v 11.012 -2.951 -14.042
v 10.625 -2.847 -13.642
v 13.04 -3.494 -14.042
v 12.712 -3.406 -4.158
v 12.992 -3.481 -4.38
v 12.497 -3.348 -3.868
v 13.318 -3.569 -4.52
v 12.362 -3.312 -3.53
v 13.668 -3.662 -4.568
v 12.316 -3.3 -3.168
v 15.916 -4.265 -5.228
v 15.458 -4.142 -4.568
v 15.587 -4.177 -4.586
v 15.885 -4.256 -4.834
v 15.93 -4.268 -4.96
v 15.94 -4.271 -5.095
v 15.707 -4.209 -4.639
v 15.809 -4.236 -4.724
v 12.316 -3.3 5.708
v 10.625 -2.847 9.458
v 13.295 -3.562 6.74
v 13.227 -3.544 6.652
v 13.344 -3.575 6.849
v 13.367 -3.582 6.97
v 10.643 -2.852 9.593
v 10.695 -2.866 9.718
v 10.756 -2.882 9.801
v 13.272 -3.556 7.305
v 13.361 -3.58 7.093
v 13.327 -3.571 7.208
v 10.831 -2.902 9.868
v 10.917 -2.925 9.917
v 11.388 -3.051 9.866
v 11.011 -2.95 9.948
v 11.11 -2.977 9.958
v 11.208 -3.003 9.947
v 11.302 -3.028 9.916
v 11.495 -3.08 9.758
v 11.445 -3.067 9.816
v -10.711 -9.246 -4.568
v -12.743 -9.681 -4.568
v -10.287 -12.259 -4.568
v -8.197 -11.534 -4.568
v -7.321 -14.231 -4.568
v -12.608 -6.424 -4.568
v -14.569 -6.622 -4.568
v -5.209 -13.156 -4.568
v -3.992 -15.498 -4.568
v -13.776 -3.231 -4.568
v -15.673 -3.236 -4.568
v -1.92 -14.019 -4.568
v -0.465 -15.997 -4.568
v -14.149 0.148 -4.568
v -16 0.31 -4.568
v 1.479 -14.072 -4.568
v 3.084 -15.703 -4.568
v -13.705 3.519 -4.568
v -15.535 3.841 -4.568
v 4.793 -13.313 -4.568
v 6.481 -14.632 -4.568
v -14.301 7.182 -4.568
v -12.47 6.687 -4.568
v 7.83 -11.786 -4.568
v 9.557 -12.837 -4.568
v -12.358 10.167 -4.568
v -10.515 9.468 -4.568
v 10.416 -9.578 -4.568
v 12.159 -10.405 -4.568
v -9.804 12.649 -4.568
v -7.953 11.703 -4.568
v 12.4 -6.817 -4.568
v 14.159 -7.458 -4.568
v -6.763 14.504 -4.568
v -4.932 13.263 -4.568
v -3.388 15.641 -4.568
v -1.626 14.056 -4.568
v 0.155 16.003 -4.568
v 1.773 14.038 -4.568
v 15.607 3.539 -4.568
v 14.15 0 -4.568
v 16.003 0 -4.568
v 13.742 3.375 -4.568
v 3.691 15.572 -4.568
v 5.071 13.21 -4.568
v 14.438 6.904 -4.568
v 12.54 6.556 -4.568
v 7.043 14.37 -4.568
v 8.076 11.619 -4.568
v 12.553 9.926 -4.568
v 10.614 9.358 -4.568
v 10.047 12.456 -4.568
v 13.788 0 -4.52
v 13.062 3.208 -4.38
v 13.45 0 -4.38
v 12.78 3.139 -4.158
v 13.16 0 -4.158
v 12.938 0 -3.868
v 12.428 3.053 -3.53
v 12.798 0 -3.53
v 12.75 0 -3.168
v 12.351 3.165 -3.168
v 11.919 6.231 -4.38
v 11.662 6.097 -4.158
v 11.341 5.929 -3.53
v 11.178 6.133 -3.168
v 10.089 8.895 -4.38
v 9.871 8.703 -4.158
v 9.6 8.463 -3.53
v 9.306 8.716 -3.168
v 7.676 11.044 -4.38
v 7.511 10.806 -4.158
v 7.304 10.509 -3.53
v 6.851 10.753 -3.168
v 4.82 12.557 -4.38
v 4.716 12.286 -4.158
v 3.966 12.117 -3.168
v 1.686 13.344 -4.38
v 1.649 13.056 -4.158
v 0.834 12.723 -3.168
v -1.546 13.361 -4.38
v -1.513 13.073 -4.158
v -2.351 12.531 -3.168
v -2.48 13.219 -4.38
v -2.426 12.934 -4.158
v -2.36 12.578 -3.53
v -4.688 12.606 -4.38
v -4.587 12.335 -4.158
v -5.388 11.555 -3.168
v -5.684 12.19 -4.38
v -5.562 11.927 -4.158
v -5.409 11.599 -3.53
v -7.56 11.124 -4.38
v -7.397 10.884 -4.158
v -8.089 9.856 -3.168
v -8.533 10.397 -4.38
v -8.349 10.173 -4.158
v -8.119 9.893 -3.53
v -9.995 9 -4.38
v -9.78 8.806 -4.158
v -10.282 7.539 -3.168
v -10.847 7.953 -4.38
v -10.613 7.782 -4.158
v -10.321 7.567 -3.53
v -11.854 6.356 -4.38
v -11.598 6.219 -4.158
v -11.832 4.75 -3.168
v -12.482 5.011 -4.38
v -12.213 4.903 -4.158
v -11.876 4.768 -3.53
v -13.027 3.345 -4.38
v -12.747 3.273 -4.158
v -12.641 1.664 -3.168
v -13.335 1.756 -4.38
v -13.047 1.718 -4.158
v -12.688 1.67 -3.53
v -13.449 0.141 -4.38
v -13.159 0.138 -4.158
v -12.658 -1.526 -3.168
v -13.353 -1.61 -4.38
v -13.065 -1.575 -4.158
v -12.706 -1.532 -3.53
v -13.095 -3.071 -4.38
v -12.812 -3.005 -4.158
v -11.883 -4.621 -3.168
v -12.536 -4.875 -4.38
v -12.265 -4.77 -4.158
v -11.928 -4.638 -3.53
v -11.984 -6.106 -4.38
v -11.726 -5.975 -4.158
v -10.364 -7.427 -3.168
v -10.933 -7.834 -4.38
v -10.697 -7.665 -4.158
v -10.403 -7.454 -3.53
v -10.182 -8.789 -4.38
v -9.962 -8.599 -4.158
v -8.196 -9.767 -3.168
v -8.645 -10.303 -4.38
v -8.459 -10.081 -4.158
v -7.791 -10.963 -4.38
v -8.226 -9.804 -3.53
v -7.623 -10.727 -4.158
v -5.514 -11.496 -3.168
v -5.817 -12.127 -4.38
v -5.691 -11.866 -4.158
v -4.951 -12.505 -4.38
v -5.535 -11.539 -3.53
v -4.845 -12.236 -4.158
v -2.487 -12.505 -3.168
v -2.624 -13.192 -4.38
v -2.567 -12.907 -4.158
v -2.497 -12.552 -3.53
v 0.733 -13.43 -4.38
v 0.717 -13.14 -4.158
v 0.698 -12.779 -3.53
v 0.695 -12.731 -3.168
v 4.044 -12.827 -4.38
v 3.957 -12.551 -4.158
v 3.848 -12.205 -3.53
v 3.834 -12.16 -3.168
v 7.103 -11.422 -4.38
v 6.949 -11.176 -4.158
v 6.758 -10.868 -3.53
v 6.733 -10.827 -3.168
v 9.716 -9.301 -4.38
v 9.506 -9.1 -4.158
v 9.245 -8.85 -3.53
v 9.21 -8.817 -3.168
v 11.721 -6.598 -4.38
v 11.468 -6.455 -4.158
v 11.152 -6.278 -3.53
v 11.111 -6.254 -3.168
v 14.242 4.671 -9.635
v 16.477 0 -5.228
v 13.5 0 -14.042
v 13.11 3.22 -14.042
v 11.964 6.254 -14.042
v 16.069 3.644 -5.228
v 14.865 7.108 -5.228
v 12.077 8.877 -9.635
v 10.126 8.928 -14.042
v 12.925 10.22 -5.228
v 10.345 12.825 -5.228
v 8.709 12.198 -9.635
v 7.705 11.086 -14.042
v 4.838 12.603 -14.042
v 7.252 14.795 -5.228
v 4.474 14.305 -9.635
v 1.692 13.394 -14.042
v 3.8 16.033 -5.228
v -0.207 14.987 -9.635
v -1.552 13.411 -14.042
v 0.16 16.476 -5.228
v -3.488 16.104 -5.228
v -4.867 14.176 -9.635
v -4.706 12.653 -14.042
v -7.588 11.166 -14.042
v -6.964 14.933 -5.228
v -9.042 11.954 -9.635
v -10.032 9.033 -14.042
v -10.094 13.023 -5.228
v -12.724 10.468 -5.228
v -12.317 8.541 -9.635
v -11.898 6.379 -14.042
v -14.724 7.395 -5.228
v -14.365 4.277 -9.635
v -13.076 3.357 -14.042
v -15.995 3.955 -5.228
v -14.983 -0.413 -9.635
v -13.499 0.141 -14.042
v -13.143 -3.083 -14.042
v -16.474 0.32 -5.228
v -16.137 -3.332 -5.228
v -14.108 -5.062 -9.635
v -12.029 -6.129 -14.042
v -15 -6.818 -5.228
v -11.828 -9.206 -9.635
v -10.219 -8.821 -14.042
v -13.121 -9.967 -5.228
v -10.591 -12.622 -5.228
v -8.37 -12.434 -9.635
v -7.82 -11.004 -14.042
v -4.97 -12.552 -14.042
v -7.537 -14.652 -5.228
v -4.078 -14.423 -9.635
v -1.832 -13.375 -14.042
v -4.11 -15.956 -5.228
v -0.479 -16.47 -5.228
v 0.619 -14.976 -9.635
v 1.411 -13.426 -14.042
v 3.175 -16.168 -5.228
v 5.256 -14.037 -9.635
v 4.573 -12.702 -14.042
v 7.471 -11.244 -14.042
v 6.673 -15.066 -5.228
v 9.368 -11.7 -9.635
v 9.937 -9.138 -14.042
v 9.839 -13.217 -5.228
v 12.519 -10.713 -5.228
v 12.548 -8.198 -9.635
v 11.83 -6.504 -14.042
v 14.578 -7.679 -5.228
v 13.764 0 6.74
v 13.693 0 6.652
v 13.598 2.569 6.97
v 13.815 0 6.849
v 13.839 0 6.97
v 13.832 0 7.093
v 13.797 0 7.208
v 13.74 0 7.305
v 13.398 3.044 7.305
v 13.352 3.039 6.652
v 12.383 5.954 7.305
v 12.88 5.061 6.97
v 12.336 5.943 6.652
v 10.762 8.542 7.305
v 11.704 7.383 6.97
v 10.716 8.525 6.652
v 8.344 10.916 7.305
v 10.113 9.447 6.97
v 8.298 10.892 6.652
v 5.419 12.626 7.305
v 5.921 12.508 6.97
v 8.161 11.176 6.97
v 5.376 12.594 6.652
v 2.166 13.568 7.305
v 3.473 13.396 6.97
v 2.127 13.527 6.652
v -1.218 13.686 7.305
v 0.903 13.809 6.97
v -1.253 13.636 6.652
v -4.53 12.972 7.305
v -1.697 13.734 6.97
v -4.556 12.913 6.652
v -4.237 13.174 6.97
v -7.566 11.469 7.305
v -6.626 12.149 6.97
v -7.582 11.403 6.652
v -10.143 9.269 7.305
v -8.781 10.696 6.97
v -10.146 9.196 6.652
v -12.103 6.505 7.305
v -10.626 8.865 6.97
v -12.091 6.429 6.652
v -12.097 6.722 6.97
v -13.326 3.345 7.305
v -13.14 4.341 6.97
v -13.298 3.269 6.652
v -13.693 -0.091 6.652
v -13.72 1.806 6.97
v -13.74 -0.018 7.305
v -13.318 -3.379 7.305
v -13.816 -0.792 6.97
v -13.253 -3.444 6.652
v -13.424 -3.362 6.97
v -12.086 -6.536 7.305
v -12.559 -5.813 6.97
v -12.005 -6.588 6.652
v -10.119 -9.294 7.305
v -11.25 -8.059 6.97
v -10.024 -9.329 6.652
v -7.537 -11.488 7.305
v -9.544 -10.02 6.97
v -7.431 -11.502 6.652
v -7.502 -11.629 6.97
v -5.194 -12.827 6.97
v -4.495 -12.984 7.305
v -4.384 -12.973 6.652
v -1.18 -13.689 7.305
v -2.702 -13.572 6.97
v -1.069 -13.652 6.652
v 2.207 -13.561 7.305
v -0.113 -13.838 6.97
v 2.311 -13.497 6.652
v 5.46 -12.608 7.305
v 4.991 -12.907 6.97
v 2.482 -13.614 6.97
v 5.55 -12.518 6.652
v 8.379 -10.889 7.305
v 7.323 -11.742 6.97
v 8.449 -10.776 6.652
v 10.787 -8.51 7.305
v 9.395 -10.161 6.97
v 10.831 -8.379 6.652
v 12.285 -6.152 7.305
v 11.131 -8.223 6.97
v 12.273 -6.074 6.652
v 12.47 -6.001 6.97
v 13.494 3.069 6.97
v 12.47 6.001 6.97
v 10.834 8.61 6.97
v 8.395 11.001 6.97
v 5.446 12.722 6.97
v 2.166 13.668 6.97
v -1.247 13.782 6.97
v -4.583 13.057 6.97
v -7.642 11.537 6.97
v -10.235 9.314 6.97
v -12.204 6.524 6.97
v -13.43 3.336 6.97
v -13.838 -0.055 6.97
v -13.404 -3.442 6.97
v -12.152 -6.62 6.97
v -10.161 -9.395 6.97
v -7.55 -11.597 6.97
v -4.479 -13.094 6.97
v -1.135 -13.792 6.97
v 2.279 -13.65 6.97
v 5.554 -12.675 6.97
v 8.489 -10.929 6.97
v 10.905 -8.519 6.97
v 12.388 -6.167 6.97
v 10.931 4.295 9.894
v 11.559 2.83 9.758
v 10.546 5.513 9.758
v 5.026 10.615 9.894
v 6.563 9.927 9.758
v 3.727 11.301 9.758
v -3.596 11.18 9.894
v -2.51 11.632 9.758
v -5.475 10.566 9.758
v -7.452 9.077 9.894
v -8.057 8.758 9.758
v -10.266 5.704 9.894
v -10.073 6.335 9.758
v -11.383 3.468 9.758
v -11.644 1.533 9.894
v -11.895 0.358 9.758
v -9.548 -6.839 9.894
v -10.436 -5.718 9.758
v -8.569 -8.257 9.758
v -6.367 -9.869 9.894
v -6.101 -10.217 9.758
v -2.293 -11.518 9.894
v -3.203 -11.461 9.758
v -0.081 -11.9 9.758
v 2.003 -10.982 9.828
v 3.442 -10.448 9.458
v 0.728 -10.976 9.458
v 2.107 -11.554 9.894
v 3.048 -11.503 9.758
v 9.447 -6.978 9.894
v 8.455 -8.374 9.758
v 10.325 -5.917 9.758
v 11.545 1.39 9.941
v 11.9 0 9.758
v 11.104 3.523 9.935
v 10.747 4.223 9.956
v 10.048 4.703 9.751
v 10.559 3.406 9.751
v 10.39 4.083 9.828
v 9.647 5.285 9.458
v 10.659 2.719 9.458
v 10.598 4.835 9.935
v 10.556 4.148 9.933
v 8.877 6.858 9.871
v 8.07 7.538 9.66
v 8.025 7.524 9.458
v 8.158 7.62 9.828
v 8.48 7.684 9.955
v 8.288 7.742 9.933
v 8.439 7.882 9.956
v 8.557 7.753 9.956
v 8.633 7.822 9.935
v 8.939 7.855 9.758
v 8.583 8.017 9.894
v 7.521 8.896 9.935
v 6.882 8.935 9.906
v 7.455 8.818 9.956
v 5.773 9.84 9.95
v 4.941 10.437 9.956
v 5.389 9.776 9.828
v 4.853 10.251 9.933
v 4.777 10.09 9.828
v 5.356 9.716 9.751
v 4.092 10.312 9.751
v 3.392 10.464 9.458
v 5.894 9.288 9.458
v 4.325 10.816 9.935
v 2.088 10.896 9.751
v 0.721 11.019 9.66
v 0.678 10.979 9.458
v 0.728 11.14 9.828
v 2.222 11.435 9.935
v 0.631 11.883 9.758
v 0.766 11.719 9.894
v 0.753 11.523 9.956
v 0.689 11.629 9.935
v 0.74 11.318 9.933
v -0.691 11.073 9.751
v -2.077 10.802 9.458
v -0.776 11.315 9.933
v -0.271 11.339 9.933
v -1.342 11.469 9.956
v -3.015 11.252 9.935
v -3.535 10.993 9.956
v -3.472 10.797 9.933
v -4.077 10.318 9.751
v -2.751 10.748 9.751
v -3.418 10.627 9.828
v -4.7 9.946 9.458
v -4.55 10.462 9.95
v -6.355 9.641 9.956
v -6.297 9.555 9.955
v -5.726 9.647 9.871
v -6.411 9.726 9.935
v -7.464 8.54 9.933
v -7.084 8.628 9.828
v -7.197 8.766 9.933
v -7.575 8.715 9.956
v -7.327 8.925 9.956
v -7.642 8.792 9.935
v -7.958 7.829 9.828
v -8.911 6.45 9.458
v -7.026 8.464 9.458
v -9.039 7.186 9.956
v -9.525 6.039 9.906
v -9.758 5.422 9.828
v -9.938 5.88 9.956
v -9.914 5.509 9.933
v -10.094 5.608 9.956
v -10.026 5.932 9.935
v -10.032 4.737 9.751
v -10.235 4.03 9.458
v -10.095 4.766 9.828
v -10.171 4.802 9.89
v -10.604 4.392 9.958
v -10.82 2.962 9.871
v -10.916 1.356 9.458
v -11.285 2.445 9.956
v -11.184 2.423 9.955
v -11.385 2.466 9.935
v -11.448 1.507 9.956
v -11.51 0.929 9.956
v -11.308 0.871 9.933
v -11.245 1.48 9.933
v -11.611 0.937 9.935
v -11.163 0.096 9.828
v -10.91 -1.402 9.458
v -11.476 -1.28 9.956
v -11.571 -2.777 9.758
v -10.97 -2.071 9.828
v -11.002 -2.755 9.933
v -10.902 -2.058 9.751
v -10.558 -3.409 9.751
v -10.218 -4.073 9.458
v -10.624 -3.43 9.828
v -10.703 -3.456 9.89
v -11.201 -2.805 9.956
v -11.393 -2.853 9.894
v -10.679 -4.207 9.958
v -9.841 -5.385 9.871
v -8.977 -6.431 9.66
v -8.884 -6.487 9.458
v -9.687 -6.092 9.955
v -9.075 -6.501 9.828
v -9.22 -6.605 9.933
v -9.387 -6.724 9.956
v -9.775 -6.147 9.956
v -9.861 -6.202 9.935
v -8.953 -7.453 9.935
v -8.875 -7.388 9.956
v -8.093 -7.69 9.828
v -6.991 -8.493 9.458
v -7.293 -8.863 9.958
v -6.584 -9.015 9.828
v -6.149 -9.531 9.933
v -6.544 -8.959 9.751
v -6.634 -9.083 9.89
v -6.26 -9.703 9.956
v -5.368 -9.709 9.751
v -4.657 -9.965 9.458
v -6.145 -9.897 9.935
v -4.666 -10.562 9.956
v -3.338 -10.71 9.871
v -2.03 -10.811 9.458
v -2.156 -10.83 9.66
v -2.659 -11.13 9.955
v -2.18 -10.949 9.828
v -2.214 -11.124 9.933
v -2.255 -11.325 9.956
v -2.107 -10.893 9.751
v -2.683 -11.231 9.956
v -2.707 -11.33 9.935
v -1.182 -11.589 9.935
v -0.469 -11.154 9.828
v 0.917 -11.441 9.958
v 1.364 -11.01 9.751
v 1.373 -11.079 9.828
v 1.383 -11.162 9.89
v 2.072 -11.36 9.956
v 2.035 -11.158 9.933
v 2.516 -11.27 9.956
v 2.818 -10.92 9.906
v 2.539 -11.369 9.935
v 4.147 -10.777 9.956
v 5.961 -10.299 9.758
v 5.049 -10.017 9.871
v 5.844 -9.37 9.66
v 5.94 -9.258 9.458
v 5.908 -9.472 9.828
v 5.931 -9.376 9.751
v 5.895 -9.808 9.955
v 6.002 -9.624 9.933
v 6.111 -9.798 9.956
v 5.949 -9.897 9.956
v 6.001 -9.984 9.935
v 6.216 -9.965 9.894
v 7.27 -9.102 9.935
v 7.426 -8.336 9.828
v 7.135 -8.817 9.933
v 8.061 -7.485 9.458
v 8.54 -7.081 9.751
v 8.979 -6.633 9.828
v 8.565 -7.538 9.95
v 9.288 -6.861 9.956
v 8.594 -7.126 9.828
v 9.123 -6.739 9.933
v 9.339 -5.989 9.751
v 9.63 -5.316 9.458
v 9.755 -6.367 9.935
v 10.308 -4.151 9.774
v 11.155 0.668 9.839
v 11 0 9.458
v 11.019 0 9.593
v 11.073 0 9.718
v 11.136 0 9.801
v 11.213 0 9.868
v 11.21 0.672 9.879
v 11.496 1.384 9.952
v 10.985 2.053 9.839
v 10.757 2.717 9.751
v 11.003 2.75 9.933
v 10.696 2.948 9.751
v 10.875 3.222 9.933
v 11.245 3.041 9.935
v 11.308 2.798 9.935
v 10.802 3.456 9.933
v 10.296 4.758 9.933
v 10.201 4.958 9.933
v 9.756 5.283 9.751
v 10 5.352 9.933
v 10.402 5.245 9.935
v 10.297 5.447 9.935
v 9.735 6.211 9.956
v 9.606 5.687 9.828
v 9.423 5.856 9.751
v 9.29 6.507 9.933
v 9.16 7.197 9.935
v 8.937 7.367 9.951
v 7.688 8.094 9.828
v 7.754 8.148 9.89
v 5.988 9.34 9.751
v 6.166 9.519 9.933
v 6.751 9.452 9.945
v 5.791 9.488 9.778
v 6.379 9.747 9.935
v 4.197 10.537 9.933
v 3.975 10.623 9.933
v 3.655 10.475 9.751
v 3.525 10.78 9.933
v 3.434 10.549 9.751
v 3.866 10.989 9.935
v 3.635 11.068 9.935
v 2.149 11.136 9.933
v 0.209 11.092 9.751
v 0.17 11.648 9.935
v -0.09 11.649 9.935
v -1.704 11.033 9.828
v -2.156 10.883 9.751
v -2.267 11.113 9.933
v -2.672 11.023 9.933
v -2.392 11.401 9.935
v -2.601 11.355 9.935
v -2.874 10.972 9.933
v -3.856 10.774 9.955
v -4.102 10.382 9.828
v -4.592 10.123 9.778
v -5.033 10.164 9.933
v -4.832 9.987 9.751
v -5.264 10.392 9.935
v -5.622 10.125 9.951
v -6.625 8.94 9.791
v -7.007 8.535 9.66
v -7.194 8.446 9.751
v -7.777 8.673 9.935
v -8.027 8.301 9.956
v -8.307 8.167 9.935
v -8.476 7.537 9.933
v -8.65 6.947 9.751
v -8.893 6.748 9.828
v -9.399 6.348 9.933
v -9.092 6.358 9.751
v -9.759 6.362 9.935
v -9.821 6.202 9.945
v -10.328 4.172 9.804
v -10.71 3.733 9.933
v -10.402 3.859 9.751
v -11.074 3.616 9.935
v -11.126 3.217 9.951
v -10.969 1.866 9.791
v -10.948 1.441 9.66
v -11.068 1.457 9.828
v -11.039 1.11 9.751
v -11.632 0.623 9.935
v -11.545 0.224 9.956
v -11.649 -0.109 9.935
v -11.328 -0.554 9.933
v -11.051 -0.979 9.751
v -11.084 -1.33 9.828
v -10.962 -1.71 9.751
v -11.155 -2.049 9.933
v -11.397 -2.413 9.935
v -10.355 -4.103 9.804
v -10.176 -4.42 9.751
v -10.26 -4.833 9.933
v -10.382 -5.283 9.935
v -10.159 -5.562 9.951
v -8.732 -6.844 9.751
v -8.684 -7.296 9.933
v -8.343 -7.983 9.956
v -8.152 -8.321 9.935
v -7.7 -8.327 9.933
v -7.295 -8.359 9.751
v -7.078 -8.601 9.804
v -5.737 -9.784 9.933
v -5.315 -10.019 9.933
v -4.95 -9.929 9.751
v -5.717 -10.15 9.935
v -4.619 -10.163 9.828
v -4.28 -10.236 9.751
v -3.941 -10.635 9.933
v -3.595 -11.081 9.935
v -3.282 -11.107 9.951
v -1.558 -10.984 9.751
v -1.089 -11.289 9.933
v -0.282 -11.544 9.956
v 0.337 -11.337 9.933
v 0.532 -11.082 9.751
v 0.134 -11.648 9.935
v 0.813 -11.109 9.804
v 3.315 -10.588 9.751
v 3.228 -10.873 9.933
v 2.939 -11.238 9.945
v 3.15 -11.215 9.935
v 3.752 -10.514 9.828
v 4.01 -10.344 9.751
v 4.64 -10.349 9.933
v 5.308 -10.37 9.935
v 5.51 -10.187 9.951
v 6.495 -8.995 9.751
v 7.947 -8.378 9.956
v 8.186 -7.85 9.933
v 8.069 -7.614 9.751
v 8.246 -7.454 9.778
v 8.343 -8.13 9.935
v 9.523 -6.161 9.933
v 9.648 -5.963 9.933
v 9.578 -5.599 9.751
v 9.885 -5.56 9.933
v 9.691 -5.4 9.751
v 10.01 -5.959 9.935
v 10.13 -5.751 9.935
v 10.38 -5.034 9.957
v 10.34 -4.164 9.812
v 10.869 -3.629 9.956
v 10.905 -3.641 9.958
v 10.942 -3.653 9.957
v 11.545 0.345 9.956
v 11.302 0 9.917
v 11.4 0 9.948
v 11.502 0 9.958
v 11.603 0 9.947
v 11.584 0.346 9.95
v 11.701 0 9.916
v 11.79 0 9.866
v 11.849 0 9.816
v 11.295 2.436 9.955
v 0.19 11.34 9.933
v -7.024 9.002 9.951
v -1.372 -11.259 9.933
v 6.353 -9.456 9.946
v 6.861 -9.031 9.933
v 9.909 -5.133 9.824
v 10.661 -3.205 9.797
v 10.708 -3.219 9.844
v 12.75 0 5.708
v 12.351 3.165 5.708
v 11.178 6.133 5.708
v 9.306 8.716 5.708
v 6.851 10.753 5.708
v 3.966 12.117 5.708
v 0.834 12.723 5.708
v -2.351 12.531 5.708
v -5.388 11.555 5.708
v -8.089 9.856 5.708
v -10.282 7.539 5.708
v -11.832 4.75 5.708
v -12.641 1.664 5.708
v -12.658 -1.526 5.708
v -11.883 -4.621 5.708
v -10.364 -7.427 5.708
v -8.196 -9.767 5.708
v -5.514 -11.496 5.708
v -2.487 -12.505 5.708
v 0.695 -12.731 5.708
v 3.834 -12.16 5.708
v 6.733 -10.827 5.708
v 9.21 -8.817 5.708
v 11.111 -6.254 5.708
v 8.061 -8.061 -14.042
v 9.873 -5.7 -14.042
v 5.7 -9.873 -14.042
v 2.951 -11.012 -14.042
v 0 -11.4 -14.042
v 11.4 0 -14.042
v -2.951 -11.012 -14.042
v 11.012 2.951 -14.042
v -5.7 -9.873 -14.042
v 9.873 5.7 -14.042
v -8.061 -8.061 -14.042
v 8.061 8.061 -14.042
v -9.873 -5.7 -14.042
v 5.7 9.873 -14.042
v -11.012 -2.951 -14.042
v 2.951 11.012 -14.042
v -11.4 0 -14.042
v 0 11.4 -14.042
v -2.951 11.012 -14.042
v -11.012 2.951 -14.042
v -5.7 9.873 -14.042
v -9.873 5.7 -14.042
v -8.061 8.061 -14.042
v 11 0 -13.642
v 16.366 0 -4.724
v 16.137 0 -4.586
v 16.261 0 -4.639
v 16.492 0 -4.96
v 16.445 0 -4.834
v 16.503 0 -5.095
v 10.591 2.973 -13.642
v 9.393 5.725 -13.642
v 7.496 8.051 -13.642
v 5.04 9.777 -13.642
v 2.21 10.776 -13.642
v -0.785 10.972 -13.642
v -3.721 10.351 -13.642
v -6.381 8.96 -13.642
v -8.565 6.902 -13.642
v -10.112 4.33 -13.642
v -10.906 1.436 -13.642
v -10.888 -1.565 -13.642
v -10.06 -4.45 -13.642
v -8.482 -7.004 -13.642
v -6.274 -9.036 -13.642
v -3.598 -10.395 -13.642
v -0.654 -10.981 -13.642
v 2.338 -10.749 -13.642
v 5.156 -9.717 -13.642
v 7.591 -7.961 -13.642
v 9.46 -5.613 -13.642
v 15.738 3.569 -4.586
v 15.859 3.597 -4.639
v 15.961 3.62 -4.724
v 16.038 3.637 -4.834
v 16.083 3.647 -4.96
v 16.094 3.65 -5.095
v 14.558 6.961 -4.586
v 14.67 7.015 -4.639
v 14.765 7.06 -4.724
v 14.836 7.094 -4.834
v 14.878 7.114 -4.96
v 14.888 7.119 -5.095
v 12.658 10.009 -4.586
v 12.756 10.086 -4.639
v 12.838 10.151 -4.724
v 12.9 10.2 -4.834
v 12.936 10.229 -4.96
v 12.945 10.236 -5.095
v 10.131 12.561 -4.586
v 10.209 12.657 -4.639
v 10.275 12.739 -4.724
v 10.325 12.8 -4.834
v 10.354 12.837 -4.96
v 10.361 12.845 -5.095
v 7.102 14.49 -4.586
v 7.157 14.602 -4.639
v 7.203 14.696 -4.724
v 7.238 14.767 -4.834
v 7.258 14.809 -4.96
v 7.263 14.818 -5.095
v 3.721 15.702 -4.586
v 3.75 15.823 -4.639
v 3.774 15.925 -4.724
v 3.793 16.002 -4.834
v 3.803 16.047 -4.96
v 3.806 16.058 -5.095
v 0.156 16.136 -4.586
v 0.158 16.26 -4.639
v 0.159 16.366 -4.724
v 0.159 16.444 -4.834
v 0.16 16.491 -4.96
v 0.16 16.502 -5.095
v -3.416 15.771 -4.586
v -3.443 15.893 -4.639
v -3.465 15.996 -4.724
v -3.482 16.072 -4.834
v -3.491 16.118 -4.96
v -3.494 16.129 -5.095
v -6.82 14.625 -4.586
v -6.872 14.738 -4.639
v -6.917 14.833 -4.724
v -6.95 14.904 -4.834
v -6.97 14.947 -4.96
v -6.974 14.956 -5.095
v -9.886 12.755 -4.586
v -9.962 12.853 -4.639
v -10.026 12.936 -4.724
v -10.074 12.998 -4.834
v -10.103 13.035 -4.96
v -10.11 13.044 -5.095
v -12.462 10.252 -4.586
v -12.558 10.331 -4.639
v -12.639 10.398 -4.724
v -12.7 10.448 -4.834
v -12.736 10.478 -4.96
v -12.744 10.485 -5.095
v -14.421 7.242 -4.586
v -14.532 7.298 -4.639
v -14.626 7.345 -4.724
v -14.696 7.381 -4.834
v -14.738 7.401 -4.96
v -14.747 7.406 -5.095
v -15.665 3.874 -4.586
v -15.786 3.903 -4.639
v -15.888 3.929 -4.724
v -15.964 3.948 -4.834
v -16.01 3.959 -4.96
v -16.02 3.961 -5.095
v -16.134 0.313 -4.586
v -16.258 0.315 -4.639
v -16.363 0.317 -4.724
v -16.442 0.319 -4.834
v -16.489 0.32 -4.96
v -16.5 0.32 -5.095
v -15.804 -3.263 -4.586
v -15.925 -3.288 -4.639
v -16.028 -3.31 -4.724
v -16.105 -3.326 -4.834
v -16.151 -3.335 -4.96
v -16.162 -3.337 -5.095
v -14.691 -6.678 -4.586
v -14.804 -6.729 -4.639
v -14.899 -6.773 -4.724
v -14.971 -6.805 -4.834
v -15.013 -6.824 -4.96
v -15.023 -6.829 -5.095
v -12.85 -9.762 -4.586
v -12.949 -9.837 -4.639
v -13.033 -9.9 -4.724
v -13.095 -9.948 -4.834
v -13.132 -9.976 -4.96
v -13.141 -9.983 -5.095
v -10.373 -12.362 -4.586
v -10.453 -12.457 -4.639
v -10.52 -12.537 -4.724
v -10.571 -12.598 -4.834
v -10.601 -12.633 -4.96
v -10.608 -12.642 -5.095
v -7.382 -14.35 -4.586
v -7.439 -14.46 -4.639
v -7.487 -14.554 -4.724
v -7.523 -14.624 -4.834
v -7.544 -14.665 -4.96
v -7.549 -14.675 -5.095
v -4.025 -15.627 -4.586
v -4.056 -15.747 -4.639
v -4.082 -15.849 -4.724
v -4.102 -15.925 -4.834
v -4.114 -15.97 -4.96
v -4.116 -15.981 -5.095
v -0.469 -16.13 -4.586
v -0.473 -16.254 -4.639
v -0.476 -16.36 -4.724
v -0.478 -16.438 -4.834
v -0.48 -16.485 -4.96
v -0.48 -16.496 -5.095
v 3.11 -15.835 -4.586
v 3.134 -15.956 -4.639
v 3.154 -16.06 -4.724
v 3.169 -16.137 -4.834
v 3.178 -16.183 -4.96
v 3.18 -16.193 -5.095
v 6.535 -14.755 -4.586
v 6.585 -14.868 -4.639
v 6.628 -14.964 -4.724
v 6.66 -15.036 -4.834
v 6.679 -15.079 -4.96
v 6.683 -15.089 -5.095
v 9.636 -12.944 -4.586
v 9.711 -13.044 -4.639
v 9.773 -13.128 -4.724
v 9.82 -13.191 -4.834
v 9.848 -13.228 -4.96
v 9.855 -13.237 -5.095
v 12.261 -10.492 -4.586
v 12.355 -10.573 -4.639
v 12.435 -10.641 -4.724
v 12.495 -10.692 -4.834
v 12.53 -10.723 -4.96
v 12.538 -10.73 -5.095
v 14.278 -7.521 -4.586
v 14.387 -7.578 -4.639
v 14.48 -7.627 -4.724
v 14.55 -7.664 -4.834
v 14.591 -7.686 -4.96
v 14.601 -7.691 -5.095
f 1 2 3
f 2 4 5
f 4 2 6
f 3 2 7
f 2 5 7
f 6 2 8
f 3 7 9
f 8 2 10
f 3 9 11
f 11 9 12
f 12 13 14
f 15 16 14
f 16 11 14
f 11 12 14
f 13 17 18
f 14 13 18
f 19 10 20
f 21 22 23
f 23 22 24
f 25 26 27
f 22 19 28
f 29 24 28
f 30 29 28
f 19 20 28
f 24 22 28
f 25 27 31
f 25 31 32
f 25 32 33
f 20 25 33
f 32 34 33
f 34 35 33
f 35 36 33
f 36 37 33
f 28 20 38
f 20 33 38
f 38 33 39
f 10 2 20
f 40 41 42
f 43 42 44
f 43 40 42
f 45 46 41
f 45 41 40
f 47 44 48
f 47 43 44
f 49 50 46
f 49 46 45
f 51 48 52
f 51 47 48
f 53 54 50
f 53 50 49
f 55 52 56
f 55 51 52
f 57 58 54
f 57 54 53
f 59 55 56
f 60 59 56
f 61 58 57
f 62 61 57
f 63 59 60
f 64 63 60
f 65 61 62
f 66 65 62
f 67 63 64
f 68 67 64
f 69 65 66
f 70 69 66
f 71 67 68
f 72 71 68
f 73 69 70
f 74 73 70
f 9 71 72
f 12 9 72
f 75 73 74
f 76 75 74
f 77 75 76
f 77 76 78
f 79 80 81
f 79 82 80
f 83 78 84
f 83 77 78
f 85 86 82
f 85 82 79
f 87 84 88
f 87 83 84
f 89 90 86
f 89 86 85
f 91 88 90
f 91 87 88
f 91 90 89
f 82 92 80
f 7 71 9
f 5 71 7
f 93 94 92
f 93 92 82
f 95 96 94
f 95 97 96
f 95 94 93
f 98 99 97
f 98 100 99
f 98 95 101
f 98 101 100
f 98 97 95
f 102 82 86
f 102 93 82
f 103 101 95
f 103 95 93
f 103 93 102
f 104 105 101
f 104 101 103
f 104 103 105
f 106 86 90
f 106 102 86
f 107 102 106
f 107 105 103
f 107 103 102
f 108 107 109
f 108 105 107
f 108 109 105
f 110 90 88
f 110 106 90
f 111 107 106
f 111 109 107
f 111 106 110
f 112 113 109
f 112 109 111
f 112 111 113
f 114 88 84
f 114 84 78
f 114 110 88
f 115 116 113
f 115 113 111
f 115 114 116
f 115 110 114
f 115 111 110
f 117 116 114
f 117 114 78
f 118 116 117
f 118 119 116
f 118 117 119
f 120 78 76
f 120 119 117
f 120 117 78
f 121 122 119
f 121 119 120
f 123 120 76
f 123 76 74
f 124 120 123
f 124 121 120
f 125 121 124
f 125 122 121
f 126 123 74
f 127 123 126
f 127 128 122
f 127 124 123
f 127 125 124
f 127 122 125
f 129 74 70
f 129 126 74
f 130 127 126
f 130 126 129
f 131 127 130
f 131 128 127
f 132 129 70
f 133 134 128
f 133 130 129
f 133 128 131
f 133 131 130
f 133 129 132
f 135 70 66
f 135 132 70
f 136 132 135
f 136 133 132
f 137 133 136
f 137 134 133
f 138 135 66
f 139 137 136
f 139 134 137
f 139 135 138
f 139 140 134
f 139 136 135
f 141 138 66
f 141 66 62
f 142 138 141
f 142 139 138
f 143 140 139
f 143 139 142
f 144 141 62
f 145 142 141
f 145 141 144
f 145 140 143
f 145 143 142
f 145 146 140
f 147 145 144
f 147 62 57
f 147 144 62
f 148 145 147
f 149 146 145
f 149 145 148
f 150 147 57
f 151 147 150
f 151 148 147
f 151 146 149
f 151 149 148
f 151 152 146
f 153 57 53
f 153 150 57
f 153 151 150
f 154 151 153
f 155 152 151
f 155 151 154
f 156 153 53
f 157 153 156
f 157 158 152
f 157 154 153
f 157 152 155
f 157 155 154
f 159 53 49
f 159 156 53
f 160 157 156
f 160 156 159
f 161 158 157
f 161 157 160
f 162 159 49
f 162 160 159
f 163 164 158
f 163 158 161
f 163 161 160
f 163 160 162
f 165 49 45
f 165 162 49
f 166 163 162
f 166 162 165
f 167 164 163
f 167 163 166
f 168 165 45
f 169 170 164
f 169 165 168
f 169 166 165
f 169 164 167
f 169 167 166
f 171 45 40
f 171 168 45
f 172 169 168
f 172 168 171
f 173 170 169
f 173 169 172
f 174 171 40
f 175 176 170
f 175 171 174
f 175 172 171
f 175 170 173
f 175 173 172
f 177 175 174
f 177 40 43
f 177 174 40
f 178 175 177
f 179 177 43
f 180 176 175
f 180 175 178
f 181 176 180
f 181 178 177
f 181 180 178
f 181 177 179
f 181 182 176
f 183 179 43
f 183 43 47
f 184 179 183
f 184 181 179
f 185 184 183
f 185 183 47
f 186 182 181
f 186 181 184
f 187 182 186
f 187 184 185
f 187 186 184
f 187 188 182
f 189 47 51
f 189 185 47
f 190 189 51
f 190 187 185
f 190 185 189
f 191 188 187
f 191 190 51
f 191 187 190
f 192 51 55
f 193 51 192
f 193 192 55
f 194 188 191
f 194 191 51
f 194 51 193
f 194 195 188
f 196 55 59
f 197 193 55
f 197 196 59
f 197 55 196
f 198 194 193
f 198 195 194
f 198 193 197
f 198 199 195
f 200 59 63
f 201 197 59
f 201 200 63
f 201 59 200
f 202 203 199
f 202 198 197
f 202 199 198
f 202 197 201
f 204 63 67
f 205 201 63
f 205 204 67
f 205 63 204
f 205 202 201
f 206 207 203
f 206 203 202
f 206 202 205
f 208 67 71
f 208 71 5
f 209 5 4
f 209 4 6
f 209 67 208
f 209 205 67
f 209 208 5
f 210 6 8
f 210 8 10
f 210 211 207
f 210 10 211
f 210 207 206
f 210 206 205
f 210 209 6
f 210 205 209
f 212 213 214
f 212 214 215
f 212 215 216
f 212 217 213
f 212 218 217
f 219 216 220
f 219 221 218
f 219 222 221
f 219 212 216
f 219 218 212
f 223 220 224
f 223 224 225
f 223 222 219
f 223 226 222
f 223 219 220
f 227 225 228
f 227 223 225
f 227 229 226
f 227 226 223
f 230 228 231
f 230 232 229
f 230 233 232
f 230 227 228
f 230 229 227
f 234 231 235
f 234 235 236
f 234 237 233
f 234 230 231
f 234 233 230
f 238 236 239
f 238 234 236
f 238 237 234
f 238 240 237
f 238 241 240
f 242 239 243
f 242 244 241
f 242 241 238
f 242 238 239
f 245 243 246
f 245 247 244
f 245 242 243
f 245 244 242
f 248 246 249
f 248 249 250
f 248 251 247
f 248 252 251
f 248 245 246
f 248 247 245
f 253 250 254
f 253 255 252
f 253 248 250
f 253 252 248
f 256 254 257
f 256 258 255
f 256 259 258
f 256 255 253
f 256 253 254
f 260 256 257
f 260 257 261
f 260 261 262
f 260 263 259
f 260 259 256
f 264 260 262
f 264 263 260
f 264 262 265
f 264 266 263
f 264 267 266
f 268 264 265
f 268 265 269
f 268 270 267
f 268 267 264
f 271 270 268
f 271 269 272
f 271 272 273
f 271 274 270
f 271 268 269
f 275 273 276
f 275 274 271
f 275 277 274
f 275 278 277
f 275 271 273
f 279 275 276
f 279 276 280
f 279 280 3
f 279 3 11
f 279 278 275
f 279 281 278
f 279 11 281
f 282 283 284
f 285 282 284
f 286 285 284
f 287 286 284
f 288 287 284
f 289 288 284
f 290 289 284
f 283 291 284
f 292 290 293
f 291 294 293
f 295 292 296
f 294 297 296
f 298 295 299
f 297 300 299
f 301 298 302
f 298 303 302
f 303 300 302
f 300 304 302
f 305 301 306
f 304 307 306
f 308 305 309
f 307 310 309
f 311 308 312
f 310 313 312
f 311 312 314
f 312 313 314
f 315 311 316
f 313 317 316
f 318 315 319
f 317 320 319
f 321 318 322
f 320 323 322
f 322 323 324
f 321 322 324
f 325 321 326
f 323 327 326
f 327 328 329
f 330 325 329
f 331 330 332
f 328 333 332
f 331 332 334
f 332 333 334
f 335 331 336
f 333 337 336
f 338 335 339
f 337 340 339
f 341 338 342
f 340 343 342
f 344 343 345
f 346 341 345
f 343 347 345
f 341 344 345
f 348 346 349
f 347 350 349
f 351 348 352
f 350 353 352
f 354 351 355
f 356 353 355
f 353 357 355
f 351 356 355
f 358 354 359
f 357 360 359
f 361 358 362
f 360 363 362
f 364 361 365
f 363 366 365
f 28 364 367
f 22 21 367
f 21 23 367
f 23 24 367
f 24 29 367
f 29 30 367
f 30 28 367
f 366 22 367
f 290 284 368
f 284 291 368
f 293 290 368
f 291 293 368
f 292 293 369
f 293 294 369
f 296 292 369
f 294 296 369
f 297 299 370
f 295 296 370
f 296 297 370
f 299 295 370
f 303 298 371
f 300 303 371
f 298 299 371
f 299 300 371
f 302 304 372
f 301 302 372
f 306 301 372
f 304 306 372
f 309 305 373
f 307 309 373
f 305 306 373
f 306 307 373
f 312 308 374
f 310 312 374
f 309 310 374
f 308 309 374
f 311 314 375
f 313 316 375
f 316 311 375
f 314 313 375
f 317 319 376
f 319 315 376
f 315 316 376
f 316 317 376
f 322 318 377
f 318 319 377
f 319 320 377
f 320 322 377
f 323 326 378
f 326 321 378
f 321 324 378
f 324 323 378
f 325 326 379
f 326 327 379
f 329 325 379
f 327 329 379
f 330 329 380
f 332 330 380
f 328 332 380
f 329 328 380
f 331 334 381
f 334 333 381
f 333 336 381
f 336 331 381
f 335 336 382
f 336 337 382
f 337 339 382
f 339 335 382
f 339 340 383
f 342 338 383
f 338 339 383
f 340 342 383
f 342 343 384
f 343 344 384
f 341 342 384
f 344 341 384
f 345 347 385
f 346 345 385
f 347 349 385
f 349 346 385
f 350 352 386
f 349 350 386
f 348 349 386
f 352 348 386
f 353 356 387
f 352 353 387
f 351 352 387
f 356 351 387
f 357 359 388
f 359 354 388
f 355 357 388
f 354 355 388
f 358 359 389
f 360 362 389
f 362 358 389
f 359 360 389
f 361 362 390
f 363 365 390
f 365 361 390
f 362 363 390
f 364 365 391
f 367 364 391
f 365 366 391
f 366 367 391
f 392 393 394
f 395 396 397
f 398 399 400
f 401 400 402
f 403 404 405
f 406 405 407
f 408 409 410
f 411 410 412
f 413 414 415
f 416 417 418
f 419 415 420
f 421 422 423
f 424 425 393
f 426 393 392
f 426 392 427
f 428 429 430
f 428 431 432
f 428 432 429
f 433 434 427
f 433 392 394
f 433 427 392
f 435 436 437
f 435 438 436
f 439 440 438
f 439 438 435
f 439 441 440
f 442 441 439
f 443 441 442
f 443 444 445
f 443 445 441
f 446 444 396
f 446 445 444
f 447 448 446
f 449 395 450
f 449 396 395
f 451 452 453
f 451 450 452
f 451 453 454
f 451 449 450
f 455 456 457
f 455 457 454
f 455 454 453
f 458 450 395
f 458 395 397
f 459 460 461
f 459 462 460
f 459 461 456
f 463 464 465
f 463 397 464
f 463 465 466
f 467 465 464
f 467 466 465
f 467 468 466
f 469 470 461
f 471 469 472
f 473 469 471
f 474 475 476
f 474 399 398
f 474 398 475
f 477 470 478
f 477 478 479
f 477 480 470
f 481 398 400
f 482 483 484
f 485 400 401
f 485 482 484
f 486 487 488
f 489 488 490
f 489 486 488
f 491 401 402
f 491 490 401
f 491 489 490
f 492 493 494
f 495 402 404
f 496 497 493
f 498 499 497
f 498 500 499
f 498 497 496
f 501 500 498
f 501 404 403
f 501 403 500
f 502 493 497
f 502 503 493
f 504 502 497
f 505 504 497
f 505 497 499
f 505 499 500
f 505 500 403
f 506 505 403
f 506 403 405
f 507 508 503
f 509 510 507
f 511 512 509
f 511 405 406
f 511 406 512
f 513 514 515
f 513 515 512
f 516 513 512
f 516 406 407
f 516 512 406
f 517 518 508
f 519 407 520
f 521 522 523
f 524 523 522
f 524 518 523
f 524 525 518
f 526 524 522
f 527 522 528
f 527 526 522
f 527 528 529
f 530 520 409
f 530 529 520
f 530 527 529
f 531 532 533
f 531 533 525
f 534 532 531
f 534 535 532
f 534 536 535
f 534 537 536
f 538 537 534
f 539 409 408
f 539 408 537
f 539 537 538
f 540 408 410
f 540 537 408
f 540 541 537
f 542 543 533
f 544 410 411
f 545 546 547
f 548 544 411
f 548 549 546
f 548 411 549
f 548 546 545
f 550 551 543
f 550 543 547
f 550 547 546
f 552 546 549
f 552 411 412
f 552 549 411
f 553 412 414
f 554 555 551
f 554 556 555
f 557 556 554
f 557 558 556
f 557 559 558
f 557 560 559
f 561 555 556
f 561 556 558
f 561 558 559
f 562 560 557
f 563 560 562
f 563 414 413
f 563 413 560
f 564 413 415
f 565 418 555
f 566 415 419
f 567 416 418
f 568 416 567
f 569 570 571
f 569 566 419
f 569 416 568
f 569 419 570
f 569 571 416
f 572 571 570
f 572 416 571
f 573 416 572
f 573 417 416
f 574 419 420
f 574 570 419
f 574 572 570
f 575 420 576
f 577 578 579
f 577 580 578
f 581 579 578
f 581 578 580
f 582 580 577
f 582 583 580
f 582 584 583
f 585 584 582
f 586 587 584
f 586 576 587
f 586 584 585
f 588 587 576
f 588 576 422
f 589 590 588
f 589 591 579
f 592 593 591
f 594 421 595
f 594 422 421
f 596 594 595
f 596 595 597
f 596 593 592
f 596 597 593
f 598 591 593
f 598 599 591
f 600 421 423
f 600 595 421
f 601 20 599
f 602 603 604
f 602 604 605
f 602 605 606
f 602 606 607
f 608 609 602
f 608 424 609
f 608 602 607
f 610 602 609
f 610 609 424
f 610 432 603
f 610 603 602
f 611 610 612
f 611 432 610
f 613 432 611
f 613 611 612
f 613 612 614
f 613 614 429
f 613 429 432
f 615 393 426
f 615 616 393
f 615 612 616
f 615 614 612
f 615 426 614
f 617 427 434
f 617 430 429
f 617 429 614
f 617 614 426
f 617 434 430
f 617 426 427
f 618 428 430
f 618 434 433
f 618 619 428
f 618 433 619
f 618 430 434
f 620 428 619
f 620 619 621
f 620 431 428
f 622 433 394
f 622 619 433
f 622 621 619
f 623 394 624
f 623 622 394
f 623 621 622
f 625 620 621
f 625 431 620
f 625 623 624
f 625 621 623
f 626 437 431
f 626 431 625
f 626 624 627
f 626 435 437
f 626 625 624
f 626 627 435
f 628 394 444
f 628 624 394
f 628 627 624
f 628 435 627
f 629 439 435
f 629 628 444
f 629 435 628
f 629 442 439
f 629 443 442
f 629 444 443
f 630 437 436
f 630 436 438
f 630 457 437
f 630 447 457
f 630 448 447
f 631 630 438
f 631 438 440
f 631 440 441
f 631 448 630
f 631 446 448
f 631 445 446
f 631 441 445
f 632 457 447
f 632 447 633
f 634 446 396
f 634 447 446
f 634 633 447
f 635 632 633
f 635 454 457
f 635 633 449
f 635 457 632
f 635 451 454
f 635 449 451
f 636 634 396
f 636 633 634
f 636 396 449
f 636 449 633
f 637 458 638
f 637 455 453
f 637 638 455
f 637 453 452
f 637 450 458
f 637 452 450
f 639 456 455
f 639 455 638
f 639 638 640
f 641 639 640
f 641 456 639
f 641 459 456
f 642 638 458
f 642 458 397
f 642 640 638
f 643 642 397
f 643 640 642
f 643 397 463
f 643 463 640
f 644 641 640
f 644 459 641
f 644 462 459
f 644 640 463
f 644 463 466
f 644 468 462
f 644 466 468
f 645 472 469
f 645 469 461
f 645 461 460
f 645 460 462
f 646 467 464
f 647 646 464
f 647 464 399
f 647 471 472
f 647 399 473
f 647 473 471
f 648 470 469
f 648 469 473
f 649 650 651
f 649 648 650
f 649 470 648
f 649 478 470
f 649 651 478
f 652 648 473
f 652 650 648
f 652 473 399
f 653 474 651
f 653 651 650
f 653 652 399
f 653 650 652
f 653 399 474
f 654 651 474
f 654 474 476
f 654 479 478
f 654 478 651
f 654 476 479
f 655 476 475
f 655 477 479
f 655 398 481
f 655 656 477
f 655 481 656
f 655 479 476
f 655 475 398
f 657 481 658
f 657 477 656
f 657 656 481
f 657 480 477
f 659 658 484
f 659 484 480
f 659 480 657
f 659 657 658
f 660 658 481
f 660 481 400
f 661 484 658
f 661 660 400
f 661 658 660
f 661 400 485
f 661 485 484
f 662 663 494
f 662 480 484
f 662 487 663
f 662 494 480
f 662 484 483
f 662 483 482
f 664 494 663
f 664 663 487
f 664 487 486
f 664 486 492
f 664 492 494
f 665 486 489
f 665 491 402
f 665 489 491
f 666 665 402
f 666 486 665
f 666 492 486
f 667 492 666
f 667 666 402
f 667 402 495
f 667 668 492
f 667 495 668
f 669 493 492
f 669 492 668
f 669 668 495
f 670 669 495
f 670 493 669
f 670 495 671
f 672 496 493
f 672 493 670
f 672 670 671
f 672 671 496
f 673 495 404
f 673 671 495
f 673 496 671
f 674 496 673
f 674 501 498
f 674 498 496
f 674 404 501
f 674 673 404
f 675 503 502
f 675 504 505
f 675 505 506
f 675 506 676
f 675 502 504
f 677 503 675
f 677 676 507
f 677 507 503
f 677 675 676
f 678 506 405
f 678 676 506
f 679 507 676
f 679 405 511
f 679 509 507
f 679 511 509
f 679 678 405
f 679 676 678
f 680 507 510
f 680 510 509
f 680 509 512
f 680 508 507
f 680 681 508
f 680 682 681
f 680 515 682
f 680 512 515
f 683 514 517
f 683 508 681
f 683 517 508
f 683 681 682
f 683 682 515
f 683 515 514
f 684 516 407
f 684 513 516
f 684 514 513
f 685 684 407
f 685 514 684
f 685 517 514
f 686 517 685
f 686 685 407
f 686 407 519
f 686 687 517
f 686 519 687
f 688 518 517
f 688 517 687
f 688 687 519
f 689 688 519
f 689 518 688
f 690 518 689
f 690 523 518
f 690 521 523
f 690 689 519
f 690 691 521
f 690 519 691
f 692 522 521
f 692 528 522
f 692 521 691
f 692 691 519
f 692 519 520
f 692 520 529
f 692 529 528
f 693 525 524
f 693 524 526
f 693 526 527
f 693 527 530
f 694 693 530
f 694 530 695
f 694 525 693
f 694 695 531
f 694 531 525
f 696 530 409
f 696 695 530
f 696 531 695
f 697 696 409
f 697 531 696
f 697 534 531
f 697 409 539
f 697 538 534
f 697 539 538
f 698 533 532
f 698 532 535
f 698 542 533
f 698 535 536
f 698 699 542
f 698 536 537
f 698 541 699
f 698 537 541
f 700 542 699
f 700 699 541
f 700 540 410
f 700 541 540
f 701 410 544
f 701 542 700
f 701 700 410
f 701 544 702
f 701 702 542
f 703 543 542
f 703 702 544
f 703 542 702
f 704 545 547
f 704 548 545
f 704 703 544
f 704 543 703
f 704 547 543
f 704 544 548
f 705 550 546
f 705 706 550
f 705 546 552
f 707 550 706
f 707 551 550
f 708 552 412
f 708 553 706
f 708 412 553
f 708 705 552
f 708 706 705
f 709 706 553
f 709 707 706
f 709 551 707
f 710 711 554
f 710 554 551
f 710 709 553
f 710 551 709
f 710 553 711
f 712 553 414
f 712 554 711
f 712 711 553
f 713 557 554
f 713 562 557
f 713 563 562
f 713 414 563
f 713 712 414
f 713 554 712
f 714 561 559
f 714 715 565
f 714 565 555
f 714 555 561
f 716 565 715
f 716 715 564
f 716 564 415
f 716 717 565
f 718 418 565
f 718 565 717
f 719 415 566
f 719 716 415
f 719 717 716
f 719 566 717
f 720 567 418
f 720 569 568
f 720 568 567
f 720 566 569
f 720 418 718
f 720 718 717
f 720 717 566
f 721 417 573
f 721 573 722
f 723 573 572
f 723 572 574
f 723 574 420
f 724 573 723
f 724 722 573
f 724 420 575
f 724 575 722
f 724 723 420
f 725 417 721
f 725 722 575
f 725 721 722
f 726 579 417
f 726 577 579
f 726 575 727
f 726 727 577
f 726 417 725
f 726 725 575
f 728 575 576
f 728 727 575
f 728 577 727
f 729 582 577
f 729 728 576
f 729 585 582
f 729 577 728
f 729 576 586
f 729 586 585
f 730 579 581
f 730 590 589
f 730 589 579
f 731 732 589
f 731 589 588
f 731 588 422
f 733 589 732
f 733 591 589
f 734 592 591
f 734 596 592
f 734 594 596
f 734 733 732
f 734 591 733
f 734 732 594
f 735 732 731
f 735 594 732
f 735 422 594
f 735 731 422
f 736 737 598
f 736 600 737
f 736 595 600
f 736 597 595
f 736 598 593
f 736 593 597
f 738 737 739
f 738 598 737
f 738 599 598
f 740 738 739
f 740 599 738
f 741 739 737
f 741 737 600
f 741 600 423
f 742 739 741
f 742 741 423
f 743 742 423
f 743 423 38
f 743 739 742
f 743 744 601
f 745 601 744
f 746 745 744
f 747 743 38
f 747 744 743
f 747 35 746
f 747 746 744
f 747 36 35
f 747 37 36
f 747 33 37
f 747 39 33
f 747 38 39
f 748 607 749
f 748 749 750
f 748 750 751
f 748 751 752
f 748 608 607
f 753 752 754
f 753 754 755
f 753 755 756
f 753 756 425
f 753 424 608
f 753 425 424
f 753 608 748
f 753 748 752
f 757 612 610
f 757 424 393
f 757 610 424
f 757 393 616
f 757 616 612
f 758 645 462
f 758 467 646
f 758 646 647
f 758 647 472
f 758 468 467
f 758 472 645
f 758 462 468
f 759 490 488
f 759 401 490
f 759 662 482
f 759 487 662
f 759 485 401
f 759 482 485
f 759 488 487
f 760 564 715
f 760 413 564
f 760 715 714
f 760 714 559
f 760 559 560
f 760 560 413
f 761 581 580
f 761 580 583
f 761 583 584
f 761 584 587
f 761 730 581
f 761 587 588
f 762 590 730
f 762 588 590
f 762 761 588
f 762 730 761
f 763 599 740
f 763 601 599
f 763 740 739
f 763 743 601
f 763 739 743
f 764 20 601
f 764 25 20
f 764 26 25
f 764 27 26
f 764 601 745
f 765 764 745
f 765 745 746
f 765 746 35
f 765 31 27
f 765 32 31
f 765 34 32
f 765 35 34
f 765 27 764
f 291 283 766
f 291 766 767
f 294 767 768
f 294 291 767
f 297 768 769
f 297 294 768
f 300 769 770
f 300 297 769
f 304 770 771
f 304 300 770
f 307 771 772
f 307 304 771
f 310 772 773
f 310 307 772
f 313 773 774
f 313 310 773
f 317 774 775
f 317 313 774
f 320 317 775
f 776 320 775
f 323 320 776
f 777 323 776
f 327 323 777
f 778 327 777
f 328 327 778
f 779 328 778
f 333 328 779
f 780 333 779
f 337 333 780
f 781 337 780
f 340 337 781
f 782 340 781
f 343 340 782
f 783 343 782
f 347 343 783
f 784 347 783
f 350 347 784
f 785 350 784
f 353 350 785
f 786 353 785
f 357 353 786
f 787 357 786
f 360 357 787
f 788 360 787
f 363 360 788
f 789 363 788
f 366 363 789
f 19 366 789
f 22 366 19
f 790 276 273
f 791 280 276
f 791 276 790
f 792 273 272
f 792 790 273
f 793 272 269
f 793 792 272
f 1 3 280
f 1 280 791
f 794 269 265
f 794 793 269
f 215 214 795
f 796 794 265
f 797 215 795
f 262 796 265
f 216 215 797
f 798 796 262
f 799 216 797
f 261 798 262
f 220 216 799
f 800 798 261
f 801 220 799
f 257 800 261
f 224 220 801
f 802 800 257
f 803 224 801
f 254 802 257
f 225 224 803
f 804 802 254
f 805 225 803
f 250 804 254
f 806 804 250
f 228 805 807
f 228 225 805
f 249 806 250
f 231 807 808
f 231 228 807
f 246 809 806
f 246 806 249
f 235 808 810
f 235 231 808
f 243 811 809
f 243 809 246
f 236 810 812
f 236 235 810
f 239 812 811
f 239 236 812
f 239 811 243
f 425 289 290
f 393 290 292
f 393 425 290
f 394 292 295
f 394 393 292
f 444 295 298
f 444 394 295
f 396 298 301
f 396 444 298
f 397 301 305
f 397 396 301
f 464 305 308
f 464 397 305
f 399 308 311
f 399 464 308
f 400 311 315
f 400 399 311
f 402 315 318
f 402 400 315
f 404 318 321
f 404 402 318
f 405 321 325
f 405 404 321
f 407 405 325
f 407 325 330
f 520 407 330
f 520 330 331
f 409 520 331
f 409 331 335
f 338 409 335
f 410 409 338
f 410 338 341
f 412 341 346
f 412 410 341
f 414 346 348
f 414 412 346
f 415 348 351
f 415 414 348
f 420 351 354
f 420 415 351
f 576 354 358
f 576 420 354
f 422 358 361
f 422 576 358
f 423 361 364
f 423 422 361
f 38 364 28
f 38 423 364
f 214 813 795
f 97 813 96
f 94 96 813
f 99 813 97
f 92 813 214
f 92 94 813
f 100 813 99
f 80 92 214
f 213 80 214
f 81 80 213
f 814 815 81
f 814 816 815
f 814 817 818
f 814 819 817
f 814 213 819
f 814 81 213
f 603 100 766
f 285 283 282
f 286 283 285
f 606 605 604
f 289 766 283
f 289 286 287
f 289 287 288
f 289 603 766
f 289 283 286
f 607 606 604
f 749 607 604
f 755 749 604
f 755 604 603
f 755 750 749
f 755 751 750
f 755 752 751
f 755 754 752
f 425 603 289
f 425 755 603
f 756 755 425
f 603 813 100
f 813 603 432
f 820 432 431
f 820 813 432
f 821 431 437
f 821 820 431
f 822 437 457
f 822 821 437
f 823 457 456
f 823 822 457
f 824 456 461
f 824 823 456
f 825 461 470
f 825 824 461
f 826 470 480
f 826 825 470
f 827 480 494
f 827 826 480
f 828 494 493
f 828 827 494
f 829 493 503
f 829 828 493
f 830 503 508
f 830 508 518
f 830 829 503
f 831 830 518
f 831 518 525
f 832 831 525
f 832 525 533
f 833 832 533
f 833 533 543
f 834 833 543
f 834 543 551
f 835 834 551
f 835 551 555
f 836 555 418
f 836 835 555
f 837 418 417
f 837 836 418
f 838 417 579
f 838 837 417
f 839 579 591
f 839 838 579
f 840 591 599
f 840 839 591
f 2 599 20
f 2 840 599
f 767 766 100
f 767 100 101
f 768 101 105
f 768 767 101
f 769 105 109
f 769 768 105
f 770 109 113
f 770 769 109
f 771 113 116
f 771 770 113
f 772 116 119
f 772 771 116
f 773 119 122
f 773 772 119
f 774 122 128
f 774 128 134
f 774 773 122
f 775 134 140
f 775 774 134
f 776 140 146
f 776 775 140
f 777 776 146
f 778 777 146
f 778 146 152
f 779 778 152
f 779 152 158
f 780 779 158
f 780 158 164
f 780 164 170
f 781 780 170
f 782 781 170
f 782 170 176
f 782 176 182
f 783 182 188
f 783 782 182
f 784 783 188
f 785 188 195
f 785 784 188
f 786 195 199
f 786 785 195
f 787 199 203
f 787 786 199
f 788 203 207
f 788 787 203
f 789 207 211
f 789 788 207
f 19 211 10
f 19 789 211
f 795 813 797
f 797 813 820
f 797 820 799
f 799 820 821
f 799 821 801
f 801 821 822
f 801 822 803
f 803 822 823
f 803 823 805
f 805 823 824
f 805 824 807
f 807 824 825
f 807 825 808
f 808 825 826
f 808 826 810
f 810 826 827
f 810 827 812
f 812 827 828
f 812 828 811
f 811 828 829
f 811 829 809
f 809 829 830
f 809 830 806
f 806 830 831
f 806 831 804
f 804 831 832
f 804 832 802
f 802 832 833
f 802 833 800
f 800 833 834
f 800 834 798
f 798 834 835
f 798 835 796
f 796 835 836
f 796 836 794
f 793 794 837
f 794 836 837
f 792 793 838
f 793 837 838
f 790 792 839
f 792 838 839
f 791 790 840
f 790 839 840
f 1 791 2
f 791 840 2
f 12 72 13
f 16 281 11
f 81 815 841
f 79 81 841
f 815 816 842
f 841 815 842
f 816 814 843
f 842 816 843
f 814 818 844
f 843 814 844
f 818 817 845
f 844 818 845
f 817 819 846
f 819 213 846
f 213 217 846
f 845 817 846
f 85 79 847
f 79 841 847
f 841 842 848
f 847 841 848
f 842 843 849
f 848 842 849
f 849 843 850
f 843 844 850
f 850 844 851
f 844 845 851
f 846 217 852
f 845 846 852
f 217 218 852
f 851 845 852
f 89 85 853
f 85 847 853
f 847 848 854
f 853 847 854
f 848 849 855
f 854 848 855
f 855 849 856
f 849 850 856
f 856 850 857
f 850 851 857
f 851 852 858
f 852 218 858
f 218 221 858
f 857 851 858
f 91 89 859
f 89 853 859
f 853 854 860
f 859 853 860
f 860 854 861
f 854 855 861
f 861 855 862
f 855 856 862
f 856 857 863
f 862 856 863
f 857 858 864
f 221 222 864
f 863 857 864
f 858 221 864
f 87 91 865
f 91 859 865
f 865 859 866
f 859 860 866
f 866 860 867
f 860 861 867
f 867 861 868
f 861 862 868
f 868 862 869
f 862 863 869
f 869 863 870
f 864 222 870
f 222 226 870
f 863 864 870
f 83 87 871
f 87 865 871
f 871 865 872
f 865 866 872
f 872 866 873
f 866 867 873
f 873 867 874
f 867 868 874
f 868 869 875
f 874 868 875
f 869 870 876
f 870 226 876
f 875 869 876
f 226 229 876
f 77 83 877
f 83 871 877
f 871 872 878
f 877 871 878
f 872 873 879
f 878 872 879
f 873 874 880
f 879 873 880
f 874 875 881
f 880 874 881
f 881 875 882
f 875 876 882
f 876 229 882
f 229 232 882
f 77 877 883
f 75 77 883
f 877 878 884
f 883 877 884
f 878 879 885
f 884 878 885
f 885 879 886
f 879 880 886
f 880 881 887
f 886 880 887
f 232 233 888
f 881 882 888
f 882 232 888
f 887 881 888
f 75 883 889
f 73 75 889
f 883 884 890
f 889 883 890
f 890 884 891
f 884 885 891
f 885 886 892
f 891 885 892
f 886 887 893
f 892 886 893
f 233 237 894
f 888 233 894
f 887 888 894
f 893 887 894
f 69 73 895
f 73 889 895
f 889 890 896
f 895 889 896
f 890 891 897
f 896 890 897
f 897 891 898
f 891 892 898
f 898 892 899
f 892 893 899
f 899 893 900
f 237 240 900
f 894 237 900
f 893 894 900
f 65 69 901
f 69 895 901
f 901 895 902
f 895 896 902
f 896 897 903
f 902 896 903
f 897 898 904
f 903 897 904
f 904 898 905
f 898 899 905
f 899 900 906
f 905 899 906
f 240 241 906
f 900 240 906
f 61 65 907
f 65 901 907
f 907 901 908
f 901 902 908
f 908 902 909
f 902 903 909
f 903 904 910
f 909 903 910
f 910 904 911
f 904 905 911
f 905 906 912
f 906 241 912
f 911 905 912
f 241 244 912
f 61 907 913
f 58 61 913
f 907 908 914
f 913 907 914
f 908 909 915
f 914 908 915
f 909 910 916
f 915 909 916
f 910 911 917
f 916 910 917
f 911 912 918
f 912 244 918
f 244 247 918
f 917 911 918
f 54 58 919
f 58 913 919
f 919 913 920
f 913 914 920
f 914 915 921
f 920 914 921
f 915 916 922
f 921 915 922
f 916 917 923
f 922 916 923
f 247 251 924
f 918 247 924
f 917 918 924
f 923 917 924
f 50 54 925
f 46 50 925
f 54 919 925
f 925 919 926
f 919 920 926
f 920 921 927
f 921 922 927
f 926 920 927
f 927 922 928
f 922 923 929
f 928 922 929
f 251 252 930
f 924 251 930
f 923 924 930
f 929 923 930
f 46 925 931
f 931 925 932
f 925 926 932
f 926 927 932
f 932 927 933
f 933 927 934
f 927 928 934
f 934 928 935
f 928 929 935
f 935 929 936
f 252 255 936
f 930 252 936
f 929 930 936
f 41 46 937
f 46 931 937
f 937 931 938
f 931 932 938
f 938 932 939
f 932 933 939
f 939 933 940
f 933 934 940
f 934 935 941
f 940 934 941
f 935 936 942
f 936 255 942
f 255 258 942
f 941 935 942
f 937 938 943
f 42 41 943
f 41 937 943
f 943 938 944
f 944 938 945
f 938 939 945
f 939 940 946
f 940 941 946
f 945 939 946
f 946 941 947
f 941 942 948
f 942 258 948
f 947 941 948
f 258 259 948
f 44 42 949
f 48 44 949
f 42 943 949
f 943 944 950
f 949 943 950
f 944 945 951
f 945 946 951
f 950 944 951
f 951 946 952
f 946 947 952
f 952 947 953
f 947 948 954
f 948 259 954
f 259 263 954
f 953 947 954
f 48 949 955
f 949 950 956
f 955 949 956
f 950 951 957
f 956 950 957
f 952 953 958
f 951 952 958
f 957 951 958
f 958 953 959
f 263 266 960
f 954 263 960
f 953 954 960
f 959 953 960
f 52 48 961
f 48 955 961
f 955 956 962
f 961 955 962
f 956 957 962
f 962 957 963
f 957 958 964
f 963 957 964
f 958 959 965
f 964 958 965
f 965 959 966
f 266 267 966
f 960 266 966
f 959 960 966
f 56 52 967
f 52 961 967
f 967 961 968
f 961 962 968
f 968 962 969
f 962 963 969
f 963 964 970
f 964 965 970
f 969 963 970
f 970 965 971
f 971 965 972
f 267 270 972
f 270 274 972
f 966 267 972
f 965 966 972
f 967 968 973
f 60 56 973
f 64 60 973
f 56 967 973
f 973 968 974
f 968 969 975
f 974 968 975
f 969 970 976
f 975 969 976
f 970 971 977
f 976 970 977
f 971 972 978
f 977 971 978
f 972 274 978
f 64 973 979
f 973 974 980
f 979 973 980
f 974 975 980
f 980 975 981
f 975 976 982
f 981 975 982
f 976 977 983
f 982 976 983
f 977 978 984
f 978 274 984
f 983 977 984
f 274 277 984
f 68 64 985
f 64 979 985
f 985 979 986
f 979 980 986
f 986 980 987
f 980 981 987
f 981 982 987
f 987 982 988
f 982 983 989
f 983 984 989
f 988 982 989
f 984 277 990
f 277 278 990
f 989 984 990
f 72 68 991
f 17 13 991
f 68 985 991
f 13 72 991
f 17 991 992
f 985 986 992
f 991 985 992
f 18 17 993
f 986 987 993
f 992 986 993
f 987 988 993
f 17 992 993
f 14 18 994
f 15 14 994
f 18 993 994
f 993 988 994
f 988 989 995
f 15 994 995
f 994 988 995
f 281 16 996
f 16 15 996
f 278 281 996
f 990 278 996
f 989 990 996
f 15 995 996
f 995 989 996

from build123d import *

# Parameters (mm, degrees)
F1_ANGLE = 345
F2_R     = 1.4
F3_R     = 0.5
F4_SIZE  = 0.4


with BuildPart() as f1:
    # F0 (on Front) → F1 (revolve)
    with BuildSketch(Plane.XZ):
        Polygon((14, 6.9582022973), (11, 10.9582022973), (11, -14.0417977027), (13.5, -14.0417977027), (16.7, -4.5676222769), (12.75, -4.5676222769), (12.75, 5.7082022973), align=None)
    revolve(axis=Axis((0, 0, 2.9440160121), (0, 0, 1)), revolution_arc=F1_ANGLE)

    # F2
    f2_edges = [f1.edges().sort_by_distance(p)[0] for p in [
        (-12.640922, 1.664209, -4.567622),
    ]]
    fillet(f2_edges, radius=F2_R)

    # F3
    f3_edges = [f1.edges().sort_by_distance(p)[0] for p in [
        (-16.557129, 2.179787, -4.567622),
        (-13.880228, 1.827367, 6.958202),
        (-10.905893, 1.435788, 10.958202),
    ]]
    fillet(f3_edges, radius=F3_R)

    # F4
    f4_edges = [f1.edges().sort_by_distance(p)[0] for p in [
        (-10.905893, 1.435788, -14.041798),
    ]]
    chamfer(f4_edges, length=F4_SIZE)


solid = f1.part
